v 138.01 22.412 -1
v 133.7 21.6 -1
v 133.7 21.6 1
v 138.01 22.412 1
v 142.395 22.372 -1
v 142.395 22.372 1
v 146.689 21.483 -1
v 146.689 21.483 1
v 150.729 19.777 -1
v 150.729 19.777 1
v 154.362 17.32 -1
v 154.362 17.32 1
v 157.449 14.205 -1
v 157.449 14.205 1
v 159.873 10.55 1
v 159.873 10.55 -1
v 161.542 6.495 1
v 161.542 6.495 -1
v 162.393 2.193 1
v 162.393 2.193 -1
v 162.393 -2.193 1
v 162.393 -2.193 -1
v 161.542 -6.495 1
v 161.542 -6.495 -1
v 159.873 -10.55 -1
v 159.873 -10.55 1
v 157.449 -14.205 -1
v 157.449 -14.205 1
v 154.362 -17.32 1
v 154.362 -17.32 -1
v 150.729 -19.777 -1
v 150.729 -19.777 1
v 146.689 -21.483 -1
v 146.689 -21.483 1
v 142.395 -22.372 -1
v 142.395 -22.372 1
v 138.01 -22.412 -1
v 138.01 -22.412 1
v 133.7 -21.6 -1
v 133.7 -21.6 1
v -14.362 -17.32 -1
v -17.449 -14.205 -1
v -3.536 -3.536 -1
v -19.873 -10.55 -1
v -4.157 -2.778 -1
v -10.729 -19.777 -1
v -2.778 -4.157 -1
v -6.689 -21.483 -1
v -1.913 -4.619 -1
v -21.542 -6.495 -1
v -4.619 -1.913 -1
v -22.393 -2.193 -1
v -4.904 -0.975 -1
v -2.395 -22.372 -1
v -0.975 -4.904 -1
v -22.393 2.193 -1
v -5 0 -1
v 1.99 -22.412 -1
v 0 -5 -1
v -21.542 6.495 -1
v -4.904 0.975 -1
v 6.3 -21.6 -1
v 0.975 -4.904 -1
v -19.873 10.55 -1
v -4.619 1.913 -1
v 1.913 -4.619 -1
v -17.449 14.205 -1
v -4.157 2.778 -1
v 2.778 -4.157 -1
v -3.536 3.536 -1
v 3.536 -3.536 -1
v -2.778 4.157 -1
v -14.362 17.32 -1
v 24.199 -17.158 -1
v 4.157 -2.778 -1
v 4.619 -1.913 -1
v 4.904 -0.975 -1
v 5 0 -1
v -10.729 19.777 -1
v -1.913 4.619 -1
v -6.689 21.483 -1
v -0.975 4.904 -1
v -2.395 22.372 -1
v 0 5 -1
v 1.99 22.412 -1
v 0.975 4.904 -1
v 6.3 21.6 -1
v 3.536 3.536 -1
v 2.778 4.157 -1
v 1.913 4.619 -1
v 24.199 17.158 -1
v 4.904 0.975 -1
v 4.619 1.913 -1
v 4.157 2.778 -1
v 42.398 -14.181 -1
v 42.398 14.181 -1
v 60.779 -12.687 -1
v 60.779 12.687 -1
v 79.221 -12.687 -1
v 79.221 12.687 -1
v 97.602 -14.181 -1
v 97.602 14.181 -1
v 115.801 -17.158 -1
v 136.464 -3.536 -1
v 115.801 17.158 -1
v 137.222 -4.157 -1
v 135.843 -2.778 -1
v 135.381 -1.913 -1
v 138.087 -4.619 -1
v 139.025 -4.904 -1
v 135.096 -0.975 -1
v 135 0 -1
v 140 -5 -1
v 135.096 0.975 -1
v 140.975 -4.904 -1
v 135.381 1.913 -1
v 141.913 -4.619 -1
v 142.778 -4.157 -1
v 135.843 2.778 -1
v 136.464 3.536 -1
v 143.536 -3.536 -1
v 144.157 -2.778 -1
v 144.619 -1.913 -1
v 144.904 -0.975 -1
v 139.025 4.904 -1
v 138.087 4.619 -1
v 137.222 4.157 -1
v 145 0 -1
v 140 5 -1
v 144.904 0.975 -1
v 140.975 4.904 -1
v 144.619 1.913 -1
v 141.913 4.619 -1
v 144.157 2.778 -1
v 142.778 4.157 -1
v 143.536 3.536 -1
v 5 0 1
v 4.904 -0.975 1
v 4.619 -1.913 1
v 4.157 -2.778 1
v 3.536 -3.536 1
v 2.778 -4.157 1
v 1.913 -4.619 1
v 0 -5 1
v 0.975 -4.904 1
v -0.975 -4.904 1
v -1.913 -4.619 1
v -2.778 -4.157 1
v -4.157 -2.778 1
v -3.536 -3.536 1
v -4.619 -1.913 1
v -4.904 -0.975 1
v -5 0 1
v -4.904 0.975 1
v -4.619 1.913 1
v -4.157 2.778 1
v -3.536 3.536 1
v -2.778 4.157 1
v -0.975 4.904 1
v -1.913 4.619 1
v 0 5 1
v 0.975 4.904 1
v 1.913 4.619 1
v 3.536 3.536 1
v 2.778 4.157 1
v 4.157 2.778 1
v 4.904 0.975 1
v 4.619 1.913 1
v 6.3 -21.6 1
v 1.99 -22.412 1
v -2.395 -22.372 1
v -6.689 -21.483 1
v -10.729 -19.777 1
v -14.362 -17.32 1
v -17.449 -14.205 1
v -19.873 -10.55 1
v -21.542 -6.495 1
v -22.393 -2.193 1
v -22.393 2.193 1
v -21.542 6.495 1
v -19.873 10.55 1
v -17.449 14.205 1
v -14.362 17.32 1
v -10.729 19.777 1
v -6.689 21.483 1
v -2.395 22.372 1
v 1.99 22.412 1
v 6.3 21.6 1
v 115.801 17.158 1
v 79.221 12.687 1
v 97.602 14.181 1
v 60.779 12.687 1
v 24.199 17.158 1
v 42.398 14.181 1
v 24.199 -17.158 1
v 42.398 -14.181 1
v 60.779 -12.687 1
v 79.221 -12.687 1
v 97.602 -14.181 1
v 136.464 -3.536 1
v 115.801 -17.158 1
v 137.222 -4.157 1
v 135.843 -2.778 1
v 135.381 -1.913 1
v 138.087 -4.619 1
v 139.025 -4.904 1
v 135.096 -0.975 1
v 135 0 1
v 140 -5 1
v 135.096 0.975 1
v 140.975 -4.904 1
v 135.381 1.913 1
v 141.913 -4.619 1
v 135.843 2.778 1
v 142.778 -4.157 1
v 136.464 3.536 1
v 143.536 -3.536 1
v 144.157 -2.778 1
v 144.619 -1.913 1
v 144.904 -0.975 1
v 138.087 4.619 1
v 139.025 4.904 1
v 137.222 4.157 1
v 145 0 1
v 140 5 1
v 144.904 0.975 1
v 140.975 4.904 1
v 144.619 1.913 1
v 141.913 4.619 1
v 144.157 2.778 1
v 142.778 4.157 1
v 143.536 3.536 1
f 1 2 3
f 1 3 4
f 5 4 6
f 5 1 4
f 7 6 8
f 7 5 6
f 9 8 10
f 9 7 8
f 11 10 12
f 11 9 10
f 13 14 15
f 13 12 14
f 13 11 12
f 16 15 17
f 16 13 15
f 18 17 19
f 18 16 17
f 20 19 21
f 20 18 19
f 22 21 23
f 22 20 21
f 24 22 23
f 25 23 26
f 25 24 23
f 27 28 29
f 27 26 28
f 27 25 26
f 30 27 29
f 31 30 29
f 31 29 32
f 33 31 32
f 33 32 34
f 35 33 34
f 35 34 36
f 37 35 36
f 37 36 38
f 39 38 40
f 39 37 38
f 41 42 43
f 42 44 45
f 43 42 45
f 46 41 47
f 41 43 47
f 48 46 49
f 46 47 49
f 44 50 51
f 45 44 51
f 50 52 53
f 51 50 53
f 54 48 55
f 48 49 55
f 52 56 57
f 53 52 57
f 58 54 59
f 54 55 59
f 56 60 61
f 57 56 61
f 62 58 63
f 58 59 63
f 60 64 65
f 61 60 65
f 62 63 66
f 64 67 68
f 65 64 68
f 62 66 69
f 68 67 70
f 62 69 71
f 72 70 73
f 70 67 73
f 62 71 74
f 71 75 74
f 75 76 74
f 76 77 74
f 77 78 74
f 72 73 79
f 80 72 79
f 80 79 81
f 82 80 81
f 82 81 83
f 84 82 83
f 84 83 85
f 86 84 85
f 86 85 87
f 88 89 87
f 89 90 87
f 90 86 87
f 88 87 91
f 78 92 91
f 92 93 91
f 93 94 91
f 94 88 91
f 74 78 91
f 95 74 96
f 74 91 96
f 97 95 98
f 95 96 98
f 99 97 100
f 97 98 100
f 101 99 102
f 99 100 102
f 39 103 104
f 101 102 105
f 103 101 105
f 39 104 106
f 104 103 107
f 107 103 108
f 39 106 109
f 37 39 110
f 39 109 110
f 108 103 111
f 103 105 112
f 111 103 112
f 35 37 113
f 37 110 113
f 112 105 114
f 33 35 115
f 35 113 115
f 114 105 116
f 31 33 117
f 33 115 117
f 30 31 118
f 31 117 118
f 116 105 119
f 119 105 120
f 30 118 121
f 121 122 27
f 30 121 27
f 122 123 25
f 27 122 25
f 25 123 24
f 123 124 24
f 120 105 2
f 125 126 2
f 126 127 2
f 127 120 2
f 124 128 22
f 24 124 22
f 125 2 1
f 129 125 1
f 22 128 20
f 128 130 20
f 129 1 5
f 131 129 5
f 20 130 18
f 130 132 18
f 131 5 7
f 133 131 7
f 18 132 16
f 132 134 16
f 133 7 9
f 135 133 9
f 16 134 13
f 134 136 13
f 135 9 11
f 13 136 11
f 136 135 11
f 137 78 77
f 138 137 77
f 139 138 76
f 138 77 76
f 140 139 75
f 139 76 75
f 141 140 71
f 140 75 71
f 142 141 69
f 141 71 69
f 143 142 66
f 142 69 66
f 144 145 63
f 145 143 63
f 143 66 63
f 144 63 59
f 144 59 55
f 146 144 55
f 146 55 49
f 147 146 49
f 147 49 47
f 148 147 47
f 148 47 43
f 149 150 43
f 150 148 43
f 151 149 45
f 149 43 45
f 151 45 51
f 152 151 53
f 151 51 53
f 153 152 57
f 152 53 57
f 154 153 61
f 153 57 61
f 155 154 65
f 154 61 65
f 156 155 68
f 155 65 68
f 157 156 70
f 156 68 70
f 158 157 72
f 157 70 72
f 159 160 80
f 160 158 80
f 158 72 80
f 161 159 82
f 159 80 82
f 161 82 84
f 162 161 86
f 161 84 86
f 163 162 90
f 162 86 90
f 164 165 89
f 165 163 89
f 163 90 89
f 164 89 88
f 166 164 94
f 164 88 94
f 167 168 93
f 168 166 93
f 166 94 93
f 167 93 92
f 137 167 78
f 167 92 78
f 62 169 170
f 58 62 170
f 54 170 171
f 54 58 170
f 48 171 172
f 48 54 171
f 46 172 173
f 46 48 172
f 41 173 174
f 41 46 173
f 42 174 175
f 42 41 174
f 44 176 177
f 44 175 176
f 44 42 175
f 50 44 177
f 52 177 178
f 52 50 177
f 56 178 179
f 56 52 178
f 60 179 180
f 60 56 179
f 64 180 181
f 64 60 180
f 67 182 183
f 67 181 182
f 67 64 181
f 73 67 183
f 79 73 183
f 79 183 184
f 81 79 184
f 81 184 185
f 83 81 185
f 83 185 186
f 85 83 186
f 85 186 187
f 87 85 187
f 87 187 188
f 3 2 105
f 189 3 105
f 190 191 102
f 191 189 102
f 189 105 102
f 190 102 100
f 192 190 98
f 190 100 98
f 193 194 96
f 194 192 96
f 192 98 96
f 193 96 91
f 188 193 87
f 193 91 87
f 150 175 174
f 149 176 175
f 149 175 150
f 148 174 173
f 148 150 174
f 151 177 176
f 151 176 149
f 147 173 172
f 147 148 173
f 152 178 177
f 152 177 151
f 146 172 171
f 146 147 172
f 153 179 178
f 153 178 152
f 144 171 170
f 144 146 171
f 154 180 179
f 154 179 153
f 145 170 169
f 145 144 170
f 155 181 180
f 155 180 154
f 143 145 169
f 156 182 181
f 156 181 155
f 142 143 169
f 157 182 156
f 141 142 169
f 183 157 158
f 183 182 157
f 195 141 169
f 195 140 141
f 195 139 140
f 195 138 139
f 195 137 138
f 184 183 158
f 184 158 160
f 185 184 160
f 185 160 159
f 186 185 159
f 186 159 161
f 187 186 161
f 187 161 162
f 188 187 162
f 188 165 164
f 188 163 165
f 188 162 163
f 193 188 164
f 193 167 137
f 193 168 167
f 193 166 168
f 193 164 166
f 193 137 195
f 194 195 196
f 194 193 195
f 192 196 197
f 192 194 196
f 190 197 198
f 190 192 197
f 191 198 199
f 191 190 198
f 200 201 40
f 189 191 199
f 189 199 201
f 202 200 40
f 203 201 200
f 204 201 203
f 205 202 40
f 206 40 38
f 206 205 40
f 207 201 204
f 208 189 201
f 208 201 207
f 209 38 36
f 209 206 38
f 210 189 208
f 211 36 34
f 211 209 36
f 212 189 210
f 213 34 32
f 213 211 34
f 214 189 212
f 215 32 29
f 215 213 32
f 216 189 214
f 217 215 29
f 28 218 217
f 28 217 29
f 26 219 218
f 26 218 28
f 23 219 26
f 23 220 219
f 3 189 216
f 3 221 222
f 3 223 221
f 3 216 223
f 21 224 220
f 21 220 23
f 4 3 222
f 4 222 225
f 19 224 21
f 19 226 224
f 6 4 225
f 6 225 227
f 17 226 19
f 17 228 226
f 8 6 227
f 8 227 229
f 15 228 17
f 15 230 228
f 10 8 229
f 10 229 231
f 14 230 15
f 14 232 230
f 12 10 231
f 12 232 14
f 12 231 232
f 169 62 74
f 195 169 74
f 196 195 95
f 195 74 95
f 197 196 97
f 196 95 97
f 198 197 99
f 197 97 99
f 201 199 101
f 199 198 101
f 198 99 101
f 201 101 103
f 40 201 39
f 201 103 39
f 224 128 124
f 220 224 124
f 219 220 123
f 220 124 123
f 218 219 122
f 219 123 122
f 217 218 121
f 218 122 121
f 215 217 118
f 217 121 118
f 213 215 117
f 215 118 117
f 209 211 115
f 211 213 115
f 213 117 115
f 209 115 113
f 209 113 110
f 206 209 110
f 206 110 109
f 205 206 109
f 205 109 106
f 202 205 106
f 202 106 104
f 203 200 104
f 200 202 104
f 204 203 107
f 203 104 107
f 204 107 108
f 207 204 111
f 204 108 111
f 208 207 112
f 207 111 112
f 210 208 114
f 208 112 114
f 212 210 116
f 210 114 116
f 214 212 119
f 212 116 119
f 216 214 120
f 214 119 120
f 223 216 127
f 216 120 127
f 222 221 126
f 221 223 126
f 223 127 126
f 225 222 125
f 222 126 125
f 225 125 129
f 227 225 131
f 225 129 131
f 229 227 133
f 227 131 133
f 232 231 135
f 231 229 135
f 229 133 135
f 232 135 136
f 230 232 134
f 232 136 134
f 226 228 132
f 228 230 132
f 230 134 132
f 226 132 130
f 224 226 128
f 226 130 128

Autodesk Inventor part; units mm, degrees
ref_plane "YZ Plane" through (0, 0, 0) normal (1, 0, 0) x (0, 1, 0)
ref_plane "XZ Plane" through (0, 0, 0) normal (0, 1, 0) x (-1, 0, 0)
ref_plane "XY Plane" through (0, 0, 0) normal (0, 0, 1) x (1, 0, 0)
sketch "Sketch1" plane through (0, 0, 0) normal (0, 0, 1) x (1, 0, 0)
  circle A0 centre (0, 0) radius 22.5
  circle A1 centre (140, 0) radius 22.5
  arc A2 (6.3, 21.6) -> (133.7, 21.6) centre (70, 240) ccw
  line L0 (162.5, 0) -> (-22.5, 0) construction
  arc A3 (133.7, -21.6) -> (6.3, -21.6) centre (70, -240) ccw
  circle A4 centre (0, 0) radius 5
  circle A5 centre (140, 0) radius 5
  point P0 (70, 12.5)
  point P1 (6.3, -21.6)
  point P2 (133.7, -21.6)
  dimension "d0" = 45
  dimension "d1" = 140
  dimension "d2" = 12.5
  dimension "d3" = 10
  dimension "d4" = 10
extrude "Extrusion1" add sketch "Sketch1" along normal mid plane 2
properties part number "stelscharnier bovenkant" material "Stainless Steel"
